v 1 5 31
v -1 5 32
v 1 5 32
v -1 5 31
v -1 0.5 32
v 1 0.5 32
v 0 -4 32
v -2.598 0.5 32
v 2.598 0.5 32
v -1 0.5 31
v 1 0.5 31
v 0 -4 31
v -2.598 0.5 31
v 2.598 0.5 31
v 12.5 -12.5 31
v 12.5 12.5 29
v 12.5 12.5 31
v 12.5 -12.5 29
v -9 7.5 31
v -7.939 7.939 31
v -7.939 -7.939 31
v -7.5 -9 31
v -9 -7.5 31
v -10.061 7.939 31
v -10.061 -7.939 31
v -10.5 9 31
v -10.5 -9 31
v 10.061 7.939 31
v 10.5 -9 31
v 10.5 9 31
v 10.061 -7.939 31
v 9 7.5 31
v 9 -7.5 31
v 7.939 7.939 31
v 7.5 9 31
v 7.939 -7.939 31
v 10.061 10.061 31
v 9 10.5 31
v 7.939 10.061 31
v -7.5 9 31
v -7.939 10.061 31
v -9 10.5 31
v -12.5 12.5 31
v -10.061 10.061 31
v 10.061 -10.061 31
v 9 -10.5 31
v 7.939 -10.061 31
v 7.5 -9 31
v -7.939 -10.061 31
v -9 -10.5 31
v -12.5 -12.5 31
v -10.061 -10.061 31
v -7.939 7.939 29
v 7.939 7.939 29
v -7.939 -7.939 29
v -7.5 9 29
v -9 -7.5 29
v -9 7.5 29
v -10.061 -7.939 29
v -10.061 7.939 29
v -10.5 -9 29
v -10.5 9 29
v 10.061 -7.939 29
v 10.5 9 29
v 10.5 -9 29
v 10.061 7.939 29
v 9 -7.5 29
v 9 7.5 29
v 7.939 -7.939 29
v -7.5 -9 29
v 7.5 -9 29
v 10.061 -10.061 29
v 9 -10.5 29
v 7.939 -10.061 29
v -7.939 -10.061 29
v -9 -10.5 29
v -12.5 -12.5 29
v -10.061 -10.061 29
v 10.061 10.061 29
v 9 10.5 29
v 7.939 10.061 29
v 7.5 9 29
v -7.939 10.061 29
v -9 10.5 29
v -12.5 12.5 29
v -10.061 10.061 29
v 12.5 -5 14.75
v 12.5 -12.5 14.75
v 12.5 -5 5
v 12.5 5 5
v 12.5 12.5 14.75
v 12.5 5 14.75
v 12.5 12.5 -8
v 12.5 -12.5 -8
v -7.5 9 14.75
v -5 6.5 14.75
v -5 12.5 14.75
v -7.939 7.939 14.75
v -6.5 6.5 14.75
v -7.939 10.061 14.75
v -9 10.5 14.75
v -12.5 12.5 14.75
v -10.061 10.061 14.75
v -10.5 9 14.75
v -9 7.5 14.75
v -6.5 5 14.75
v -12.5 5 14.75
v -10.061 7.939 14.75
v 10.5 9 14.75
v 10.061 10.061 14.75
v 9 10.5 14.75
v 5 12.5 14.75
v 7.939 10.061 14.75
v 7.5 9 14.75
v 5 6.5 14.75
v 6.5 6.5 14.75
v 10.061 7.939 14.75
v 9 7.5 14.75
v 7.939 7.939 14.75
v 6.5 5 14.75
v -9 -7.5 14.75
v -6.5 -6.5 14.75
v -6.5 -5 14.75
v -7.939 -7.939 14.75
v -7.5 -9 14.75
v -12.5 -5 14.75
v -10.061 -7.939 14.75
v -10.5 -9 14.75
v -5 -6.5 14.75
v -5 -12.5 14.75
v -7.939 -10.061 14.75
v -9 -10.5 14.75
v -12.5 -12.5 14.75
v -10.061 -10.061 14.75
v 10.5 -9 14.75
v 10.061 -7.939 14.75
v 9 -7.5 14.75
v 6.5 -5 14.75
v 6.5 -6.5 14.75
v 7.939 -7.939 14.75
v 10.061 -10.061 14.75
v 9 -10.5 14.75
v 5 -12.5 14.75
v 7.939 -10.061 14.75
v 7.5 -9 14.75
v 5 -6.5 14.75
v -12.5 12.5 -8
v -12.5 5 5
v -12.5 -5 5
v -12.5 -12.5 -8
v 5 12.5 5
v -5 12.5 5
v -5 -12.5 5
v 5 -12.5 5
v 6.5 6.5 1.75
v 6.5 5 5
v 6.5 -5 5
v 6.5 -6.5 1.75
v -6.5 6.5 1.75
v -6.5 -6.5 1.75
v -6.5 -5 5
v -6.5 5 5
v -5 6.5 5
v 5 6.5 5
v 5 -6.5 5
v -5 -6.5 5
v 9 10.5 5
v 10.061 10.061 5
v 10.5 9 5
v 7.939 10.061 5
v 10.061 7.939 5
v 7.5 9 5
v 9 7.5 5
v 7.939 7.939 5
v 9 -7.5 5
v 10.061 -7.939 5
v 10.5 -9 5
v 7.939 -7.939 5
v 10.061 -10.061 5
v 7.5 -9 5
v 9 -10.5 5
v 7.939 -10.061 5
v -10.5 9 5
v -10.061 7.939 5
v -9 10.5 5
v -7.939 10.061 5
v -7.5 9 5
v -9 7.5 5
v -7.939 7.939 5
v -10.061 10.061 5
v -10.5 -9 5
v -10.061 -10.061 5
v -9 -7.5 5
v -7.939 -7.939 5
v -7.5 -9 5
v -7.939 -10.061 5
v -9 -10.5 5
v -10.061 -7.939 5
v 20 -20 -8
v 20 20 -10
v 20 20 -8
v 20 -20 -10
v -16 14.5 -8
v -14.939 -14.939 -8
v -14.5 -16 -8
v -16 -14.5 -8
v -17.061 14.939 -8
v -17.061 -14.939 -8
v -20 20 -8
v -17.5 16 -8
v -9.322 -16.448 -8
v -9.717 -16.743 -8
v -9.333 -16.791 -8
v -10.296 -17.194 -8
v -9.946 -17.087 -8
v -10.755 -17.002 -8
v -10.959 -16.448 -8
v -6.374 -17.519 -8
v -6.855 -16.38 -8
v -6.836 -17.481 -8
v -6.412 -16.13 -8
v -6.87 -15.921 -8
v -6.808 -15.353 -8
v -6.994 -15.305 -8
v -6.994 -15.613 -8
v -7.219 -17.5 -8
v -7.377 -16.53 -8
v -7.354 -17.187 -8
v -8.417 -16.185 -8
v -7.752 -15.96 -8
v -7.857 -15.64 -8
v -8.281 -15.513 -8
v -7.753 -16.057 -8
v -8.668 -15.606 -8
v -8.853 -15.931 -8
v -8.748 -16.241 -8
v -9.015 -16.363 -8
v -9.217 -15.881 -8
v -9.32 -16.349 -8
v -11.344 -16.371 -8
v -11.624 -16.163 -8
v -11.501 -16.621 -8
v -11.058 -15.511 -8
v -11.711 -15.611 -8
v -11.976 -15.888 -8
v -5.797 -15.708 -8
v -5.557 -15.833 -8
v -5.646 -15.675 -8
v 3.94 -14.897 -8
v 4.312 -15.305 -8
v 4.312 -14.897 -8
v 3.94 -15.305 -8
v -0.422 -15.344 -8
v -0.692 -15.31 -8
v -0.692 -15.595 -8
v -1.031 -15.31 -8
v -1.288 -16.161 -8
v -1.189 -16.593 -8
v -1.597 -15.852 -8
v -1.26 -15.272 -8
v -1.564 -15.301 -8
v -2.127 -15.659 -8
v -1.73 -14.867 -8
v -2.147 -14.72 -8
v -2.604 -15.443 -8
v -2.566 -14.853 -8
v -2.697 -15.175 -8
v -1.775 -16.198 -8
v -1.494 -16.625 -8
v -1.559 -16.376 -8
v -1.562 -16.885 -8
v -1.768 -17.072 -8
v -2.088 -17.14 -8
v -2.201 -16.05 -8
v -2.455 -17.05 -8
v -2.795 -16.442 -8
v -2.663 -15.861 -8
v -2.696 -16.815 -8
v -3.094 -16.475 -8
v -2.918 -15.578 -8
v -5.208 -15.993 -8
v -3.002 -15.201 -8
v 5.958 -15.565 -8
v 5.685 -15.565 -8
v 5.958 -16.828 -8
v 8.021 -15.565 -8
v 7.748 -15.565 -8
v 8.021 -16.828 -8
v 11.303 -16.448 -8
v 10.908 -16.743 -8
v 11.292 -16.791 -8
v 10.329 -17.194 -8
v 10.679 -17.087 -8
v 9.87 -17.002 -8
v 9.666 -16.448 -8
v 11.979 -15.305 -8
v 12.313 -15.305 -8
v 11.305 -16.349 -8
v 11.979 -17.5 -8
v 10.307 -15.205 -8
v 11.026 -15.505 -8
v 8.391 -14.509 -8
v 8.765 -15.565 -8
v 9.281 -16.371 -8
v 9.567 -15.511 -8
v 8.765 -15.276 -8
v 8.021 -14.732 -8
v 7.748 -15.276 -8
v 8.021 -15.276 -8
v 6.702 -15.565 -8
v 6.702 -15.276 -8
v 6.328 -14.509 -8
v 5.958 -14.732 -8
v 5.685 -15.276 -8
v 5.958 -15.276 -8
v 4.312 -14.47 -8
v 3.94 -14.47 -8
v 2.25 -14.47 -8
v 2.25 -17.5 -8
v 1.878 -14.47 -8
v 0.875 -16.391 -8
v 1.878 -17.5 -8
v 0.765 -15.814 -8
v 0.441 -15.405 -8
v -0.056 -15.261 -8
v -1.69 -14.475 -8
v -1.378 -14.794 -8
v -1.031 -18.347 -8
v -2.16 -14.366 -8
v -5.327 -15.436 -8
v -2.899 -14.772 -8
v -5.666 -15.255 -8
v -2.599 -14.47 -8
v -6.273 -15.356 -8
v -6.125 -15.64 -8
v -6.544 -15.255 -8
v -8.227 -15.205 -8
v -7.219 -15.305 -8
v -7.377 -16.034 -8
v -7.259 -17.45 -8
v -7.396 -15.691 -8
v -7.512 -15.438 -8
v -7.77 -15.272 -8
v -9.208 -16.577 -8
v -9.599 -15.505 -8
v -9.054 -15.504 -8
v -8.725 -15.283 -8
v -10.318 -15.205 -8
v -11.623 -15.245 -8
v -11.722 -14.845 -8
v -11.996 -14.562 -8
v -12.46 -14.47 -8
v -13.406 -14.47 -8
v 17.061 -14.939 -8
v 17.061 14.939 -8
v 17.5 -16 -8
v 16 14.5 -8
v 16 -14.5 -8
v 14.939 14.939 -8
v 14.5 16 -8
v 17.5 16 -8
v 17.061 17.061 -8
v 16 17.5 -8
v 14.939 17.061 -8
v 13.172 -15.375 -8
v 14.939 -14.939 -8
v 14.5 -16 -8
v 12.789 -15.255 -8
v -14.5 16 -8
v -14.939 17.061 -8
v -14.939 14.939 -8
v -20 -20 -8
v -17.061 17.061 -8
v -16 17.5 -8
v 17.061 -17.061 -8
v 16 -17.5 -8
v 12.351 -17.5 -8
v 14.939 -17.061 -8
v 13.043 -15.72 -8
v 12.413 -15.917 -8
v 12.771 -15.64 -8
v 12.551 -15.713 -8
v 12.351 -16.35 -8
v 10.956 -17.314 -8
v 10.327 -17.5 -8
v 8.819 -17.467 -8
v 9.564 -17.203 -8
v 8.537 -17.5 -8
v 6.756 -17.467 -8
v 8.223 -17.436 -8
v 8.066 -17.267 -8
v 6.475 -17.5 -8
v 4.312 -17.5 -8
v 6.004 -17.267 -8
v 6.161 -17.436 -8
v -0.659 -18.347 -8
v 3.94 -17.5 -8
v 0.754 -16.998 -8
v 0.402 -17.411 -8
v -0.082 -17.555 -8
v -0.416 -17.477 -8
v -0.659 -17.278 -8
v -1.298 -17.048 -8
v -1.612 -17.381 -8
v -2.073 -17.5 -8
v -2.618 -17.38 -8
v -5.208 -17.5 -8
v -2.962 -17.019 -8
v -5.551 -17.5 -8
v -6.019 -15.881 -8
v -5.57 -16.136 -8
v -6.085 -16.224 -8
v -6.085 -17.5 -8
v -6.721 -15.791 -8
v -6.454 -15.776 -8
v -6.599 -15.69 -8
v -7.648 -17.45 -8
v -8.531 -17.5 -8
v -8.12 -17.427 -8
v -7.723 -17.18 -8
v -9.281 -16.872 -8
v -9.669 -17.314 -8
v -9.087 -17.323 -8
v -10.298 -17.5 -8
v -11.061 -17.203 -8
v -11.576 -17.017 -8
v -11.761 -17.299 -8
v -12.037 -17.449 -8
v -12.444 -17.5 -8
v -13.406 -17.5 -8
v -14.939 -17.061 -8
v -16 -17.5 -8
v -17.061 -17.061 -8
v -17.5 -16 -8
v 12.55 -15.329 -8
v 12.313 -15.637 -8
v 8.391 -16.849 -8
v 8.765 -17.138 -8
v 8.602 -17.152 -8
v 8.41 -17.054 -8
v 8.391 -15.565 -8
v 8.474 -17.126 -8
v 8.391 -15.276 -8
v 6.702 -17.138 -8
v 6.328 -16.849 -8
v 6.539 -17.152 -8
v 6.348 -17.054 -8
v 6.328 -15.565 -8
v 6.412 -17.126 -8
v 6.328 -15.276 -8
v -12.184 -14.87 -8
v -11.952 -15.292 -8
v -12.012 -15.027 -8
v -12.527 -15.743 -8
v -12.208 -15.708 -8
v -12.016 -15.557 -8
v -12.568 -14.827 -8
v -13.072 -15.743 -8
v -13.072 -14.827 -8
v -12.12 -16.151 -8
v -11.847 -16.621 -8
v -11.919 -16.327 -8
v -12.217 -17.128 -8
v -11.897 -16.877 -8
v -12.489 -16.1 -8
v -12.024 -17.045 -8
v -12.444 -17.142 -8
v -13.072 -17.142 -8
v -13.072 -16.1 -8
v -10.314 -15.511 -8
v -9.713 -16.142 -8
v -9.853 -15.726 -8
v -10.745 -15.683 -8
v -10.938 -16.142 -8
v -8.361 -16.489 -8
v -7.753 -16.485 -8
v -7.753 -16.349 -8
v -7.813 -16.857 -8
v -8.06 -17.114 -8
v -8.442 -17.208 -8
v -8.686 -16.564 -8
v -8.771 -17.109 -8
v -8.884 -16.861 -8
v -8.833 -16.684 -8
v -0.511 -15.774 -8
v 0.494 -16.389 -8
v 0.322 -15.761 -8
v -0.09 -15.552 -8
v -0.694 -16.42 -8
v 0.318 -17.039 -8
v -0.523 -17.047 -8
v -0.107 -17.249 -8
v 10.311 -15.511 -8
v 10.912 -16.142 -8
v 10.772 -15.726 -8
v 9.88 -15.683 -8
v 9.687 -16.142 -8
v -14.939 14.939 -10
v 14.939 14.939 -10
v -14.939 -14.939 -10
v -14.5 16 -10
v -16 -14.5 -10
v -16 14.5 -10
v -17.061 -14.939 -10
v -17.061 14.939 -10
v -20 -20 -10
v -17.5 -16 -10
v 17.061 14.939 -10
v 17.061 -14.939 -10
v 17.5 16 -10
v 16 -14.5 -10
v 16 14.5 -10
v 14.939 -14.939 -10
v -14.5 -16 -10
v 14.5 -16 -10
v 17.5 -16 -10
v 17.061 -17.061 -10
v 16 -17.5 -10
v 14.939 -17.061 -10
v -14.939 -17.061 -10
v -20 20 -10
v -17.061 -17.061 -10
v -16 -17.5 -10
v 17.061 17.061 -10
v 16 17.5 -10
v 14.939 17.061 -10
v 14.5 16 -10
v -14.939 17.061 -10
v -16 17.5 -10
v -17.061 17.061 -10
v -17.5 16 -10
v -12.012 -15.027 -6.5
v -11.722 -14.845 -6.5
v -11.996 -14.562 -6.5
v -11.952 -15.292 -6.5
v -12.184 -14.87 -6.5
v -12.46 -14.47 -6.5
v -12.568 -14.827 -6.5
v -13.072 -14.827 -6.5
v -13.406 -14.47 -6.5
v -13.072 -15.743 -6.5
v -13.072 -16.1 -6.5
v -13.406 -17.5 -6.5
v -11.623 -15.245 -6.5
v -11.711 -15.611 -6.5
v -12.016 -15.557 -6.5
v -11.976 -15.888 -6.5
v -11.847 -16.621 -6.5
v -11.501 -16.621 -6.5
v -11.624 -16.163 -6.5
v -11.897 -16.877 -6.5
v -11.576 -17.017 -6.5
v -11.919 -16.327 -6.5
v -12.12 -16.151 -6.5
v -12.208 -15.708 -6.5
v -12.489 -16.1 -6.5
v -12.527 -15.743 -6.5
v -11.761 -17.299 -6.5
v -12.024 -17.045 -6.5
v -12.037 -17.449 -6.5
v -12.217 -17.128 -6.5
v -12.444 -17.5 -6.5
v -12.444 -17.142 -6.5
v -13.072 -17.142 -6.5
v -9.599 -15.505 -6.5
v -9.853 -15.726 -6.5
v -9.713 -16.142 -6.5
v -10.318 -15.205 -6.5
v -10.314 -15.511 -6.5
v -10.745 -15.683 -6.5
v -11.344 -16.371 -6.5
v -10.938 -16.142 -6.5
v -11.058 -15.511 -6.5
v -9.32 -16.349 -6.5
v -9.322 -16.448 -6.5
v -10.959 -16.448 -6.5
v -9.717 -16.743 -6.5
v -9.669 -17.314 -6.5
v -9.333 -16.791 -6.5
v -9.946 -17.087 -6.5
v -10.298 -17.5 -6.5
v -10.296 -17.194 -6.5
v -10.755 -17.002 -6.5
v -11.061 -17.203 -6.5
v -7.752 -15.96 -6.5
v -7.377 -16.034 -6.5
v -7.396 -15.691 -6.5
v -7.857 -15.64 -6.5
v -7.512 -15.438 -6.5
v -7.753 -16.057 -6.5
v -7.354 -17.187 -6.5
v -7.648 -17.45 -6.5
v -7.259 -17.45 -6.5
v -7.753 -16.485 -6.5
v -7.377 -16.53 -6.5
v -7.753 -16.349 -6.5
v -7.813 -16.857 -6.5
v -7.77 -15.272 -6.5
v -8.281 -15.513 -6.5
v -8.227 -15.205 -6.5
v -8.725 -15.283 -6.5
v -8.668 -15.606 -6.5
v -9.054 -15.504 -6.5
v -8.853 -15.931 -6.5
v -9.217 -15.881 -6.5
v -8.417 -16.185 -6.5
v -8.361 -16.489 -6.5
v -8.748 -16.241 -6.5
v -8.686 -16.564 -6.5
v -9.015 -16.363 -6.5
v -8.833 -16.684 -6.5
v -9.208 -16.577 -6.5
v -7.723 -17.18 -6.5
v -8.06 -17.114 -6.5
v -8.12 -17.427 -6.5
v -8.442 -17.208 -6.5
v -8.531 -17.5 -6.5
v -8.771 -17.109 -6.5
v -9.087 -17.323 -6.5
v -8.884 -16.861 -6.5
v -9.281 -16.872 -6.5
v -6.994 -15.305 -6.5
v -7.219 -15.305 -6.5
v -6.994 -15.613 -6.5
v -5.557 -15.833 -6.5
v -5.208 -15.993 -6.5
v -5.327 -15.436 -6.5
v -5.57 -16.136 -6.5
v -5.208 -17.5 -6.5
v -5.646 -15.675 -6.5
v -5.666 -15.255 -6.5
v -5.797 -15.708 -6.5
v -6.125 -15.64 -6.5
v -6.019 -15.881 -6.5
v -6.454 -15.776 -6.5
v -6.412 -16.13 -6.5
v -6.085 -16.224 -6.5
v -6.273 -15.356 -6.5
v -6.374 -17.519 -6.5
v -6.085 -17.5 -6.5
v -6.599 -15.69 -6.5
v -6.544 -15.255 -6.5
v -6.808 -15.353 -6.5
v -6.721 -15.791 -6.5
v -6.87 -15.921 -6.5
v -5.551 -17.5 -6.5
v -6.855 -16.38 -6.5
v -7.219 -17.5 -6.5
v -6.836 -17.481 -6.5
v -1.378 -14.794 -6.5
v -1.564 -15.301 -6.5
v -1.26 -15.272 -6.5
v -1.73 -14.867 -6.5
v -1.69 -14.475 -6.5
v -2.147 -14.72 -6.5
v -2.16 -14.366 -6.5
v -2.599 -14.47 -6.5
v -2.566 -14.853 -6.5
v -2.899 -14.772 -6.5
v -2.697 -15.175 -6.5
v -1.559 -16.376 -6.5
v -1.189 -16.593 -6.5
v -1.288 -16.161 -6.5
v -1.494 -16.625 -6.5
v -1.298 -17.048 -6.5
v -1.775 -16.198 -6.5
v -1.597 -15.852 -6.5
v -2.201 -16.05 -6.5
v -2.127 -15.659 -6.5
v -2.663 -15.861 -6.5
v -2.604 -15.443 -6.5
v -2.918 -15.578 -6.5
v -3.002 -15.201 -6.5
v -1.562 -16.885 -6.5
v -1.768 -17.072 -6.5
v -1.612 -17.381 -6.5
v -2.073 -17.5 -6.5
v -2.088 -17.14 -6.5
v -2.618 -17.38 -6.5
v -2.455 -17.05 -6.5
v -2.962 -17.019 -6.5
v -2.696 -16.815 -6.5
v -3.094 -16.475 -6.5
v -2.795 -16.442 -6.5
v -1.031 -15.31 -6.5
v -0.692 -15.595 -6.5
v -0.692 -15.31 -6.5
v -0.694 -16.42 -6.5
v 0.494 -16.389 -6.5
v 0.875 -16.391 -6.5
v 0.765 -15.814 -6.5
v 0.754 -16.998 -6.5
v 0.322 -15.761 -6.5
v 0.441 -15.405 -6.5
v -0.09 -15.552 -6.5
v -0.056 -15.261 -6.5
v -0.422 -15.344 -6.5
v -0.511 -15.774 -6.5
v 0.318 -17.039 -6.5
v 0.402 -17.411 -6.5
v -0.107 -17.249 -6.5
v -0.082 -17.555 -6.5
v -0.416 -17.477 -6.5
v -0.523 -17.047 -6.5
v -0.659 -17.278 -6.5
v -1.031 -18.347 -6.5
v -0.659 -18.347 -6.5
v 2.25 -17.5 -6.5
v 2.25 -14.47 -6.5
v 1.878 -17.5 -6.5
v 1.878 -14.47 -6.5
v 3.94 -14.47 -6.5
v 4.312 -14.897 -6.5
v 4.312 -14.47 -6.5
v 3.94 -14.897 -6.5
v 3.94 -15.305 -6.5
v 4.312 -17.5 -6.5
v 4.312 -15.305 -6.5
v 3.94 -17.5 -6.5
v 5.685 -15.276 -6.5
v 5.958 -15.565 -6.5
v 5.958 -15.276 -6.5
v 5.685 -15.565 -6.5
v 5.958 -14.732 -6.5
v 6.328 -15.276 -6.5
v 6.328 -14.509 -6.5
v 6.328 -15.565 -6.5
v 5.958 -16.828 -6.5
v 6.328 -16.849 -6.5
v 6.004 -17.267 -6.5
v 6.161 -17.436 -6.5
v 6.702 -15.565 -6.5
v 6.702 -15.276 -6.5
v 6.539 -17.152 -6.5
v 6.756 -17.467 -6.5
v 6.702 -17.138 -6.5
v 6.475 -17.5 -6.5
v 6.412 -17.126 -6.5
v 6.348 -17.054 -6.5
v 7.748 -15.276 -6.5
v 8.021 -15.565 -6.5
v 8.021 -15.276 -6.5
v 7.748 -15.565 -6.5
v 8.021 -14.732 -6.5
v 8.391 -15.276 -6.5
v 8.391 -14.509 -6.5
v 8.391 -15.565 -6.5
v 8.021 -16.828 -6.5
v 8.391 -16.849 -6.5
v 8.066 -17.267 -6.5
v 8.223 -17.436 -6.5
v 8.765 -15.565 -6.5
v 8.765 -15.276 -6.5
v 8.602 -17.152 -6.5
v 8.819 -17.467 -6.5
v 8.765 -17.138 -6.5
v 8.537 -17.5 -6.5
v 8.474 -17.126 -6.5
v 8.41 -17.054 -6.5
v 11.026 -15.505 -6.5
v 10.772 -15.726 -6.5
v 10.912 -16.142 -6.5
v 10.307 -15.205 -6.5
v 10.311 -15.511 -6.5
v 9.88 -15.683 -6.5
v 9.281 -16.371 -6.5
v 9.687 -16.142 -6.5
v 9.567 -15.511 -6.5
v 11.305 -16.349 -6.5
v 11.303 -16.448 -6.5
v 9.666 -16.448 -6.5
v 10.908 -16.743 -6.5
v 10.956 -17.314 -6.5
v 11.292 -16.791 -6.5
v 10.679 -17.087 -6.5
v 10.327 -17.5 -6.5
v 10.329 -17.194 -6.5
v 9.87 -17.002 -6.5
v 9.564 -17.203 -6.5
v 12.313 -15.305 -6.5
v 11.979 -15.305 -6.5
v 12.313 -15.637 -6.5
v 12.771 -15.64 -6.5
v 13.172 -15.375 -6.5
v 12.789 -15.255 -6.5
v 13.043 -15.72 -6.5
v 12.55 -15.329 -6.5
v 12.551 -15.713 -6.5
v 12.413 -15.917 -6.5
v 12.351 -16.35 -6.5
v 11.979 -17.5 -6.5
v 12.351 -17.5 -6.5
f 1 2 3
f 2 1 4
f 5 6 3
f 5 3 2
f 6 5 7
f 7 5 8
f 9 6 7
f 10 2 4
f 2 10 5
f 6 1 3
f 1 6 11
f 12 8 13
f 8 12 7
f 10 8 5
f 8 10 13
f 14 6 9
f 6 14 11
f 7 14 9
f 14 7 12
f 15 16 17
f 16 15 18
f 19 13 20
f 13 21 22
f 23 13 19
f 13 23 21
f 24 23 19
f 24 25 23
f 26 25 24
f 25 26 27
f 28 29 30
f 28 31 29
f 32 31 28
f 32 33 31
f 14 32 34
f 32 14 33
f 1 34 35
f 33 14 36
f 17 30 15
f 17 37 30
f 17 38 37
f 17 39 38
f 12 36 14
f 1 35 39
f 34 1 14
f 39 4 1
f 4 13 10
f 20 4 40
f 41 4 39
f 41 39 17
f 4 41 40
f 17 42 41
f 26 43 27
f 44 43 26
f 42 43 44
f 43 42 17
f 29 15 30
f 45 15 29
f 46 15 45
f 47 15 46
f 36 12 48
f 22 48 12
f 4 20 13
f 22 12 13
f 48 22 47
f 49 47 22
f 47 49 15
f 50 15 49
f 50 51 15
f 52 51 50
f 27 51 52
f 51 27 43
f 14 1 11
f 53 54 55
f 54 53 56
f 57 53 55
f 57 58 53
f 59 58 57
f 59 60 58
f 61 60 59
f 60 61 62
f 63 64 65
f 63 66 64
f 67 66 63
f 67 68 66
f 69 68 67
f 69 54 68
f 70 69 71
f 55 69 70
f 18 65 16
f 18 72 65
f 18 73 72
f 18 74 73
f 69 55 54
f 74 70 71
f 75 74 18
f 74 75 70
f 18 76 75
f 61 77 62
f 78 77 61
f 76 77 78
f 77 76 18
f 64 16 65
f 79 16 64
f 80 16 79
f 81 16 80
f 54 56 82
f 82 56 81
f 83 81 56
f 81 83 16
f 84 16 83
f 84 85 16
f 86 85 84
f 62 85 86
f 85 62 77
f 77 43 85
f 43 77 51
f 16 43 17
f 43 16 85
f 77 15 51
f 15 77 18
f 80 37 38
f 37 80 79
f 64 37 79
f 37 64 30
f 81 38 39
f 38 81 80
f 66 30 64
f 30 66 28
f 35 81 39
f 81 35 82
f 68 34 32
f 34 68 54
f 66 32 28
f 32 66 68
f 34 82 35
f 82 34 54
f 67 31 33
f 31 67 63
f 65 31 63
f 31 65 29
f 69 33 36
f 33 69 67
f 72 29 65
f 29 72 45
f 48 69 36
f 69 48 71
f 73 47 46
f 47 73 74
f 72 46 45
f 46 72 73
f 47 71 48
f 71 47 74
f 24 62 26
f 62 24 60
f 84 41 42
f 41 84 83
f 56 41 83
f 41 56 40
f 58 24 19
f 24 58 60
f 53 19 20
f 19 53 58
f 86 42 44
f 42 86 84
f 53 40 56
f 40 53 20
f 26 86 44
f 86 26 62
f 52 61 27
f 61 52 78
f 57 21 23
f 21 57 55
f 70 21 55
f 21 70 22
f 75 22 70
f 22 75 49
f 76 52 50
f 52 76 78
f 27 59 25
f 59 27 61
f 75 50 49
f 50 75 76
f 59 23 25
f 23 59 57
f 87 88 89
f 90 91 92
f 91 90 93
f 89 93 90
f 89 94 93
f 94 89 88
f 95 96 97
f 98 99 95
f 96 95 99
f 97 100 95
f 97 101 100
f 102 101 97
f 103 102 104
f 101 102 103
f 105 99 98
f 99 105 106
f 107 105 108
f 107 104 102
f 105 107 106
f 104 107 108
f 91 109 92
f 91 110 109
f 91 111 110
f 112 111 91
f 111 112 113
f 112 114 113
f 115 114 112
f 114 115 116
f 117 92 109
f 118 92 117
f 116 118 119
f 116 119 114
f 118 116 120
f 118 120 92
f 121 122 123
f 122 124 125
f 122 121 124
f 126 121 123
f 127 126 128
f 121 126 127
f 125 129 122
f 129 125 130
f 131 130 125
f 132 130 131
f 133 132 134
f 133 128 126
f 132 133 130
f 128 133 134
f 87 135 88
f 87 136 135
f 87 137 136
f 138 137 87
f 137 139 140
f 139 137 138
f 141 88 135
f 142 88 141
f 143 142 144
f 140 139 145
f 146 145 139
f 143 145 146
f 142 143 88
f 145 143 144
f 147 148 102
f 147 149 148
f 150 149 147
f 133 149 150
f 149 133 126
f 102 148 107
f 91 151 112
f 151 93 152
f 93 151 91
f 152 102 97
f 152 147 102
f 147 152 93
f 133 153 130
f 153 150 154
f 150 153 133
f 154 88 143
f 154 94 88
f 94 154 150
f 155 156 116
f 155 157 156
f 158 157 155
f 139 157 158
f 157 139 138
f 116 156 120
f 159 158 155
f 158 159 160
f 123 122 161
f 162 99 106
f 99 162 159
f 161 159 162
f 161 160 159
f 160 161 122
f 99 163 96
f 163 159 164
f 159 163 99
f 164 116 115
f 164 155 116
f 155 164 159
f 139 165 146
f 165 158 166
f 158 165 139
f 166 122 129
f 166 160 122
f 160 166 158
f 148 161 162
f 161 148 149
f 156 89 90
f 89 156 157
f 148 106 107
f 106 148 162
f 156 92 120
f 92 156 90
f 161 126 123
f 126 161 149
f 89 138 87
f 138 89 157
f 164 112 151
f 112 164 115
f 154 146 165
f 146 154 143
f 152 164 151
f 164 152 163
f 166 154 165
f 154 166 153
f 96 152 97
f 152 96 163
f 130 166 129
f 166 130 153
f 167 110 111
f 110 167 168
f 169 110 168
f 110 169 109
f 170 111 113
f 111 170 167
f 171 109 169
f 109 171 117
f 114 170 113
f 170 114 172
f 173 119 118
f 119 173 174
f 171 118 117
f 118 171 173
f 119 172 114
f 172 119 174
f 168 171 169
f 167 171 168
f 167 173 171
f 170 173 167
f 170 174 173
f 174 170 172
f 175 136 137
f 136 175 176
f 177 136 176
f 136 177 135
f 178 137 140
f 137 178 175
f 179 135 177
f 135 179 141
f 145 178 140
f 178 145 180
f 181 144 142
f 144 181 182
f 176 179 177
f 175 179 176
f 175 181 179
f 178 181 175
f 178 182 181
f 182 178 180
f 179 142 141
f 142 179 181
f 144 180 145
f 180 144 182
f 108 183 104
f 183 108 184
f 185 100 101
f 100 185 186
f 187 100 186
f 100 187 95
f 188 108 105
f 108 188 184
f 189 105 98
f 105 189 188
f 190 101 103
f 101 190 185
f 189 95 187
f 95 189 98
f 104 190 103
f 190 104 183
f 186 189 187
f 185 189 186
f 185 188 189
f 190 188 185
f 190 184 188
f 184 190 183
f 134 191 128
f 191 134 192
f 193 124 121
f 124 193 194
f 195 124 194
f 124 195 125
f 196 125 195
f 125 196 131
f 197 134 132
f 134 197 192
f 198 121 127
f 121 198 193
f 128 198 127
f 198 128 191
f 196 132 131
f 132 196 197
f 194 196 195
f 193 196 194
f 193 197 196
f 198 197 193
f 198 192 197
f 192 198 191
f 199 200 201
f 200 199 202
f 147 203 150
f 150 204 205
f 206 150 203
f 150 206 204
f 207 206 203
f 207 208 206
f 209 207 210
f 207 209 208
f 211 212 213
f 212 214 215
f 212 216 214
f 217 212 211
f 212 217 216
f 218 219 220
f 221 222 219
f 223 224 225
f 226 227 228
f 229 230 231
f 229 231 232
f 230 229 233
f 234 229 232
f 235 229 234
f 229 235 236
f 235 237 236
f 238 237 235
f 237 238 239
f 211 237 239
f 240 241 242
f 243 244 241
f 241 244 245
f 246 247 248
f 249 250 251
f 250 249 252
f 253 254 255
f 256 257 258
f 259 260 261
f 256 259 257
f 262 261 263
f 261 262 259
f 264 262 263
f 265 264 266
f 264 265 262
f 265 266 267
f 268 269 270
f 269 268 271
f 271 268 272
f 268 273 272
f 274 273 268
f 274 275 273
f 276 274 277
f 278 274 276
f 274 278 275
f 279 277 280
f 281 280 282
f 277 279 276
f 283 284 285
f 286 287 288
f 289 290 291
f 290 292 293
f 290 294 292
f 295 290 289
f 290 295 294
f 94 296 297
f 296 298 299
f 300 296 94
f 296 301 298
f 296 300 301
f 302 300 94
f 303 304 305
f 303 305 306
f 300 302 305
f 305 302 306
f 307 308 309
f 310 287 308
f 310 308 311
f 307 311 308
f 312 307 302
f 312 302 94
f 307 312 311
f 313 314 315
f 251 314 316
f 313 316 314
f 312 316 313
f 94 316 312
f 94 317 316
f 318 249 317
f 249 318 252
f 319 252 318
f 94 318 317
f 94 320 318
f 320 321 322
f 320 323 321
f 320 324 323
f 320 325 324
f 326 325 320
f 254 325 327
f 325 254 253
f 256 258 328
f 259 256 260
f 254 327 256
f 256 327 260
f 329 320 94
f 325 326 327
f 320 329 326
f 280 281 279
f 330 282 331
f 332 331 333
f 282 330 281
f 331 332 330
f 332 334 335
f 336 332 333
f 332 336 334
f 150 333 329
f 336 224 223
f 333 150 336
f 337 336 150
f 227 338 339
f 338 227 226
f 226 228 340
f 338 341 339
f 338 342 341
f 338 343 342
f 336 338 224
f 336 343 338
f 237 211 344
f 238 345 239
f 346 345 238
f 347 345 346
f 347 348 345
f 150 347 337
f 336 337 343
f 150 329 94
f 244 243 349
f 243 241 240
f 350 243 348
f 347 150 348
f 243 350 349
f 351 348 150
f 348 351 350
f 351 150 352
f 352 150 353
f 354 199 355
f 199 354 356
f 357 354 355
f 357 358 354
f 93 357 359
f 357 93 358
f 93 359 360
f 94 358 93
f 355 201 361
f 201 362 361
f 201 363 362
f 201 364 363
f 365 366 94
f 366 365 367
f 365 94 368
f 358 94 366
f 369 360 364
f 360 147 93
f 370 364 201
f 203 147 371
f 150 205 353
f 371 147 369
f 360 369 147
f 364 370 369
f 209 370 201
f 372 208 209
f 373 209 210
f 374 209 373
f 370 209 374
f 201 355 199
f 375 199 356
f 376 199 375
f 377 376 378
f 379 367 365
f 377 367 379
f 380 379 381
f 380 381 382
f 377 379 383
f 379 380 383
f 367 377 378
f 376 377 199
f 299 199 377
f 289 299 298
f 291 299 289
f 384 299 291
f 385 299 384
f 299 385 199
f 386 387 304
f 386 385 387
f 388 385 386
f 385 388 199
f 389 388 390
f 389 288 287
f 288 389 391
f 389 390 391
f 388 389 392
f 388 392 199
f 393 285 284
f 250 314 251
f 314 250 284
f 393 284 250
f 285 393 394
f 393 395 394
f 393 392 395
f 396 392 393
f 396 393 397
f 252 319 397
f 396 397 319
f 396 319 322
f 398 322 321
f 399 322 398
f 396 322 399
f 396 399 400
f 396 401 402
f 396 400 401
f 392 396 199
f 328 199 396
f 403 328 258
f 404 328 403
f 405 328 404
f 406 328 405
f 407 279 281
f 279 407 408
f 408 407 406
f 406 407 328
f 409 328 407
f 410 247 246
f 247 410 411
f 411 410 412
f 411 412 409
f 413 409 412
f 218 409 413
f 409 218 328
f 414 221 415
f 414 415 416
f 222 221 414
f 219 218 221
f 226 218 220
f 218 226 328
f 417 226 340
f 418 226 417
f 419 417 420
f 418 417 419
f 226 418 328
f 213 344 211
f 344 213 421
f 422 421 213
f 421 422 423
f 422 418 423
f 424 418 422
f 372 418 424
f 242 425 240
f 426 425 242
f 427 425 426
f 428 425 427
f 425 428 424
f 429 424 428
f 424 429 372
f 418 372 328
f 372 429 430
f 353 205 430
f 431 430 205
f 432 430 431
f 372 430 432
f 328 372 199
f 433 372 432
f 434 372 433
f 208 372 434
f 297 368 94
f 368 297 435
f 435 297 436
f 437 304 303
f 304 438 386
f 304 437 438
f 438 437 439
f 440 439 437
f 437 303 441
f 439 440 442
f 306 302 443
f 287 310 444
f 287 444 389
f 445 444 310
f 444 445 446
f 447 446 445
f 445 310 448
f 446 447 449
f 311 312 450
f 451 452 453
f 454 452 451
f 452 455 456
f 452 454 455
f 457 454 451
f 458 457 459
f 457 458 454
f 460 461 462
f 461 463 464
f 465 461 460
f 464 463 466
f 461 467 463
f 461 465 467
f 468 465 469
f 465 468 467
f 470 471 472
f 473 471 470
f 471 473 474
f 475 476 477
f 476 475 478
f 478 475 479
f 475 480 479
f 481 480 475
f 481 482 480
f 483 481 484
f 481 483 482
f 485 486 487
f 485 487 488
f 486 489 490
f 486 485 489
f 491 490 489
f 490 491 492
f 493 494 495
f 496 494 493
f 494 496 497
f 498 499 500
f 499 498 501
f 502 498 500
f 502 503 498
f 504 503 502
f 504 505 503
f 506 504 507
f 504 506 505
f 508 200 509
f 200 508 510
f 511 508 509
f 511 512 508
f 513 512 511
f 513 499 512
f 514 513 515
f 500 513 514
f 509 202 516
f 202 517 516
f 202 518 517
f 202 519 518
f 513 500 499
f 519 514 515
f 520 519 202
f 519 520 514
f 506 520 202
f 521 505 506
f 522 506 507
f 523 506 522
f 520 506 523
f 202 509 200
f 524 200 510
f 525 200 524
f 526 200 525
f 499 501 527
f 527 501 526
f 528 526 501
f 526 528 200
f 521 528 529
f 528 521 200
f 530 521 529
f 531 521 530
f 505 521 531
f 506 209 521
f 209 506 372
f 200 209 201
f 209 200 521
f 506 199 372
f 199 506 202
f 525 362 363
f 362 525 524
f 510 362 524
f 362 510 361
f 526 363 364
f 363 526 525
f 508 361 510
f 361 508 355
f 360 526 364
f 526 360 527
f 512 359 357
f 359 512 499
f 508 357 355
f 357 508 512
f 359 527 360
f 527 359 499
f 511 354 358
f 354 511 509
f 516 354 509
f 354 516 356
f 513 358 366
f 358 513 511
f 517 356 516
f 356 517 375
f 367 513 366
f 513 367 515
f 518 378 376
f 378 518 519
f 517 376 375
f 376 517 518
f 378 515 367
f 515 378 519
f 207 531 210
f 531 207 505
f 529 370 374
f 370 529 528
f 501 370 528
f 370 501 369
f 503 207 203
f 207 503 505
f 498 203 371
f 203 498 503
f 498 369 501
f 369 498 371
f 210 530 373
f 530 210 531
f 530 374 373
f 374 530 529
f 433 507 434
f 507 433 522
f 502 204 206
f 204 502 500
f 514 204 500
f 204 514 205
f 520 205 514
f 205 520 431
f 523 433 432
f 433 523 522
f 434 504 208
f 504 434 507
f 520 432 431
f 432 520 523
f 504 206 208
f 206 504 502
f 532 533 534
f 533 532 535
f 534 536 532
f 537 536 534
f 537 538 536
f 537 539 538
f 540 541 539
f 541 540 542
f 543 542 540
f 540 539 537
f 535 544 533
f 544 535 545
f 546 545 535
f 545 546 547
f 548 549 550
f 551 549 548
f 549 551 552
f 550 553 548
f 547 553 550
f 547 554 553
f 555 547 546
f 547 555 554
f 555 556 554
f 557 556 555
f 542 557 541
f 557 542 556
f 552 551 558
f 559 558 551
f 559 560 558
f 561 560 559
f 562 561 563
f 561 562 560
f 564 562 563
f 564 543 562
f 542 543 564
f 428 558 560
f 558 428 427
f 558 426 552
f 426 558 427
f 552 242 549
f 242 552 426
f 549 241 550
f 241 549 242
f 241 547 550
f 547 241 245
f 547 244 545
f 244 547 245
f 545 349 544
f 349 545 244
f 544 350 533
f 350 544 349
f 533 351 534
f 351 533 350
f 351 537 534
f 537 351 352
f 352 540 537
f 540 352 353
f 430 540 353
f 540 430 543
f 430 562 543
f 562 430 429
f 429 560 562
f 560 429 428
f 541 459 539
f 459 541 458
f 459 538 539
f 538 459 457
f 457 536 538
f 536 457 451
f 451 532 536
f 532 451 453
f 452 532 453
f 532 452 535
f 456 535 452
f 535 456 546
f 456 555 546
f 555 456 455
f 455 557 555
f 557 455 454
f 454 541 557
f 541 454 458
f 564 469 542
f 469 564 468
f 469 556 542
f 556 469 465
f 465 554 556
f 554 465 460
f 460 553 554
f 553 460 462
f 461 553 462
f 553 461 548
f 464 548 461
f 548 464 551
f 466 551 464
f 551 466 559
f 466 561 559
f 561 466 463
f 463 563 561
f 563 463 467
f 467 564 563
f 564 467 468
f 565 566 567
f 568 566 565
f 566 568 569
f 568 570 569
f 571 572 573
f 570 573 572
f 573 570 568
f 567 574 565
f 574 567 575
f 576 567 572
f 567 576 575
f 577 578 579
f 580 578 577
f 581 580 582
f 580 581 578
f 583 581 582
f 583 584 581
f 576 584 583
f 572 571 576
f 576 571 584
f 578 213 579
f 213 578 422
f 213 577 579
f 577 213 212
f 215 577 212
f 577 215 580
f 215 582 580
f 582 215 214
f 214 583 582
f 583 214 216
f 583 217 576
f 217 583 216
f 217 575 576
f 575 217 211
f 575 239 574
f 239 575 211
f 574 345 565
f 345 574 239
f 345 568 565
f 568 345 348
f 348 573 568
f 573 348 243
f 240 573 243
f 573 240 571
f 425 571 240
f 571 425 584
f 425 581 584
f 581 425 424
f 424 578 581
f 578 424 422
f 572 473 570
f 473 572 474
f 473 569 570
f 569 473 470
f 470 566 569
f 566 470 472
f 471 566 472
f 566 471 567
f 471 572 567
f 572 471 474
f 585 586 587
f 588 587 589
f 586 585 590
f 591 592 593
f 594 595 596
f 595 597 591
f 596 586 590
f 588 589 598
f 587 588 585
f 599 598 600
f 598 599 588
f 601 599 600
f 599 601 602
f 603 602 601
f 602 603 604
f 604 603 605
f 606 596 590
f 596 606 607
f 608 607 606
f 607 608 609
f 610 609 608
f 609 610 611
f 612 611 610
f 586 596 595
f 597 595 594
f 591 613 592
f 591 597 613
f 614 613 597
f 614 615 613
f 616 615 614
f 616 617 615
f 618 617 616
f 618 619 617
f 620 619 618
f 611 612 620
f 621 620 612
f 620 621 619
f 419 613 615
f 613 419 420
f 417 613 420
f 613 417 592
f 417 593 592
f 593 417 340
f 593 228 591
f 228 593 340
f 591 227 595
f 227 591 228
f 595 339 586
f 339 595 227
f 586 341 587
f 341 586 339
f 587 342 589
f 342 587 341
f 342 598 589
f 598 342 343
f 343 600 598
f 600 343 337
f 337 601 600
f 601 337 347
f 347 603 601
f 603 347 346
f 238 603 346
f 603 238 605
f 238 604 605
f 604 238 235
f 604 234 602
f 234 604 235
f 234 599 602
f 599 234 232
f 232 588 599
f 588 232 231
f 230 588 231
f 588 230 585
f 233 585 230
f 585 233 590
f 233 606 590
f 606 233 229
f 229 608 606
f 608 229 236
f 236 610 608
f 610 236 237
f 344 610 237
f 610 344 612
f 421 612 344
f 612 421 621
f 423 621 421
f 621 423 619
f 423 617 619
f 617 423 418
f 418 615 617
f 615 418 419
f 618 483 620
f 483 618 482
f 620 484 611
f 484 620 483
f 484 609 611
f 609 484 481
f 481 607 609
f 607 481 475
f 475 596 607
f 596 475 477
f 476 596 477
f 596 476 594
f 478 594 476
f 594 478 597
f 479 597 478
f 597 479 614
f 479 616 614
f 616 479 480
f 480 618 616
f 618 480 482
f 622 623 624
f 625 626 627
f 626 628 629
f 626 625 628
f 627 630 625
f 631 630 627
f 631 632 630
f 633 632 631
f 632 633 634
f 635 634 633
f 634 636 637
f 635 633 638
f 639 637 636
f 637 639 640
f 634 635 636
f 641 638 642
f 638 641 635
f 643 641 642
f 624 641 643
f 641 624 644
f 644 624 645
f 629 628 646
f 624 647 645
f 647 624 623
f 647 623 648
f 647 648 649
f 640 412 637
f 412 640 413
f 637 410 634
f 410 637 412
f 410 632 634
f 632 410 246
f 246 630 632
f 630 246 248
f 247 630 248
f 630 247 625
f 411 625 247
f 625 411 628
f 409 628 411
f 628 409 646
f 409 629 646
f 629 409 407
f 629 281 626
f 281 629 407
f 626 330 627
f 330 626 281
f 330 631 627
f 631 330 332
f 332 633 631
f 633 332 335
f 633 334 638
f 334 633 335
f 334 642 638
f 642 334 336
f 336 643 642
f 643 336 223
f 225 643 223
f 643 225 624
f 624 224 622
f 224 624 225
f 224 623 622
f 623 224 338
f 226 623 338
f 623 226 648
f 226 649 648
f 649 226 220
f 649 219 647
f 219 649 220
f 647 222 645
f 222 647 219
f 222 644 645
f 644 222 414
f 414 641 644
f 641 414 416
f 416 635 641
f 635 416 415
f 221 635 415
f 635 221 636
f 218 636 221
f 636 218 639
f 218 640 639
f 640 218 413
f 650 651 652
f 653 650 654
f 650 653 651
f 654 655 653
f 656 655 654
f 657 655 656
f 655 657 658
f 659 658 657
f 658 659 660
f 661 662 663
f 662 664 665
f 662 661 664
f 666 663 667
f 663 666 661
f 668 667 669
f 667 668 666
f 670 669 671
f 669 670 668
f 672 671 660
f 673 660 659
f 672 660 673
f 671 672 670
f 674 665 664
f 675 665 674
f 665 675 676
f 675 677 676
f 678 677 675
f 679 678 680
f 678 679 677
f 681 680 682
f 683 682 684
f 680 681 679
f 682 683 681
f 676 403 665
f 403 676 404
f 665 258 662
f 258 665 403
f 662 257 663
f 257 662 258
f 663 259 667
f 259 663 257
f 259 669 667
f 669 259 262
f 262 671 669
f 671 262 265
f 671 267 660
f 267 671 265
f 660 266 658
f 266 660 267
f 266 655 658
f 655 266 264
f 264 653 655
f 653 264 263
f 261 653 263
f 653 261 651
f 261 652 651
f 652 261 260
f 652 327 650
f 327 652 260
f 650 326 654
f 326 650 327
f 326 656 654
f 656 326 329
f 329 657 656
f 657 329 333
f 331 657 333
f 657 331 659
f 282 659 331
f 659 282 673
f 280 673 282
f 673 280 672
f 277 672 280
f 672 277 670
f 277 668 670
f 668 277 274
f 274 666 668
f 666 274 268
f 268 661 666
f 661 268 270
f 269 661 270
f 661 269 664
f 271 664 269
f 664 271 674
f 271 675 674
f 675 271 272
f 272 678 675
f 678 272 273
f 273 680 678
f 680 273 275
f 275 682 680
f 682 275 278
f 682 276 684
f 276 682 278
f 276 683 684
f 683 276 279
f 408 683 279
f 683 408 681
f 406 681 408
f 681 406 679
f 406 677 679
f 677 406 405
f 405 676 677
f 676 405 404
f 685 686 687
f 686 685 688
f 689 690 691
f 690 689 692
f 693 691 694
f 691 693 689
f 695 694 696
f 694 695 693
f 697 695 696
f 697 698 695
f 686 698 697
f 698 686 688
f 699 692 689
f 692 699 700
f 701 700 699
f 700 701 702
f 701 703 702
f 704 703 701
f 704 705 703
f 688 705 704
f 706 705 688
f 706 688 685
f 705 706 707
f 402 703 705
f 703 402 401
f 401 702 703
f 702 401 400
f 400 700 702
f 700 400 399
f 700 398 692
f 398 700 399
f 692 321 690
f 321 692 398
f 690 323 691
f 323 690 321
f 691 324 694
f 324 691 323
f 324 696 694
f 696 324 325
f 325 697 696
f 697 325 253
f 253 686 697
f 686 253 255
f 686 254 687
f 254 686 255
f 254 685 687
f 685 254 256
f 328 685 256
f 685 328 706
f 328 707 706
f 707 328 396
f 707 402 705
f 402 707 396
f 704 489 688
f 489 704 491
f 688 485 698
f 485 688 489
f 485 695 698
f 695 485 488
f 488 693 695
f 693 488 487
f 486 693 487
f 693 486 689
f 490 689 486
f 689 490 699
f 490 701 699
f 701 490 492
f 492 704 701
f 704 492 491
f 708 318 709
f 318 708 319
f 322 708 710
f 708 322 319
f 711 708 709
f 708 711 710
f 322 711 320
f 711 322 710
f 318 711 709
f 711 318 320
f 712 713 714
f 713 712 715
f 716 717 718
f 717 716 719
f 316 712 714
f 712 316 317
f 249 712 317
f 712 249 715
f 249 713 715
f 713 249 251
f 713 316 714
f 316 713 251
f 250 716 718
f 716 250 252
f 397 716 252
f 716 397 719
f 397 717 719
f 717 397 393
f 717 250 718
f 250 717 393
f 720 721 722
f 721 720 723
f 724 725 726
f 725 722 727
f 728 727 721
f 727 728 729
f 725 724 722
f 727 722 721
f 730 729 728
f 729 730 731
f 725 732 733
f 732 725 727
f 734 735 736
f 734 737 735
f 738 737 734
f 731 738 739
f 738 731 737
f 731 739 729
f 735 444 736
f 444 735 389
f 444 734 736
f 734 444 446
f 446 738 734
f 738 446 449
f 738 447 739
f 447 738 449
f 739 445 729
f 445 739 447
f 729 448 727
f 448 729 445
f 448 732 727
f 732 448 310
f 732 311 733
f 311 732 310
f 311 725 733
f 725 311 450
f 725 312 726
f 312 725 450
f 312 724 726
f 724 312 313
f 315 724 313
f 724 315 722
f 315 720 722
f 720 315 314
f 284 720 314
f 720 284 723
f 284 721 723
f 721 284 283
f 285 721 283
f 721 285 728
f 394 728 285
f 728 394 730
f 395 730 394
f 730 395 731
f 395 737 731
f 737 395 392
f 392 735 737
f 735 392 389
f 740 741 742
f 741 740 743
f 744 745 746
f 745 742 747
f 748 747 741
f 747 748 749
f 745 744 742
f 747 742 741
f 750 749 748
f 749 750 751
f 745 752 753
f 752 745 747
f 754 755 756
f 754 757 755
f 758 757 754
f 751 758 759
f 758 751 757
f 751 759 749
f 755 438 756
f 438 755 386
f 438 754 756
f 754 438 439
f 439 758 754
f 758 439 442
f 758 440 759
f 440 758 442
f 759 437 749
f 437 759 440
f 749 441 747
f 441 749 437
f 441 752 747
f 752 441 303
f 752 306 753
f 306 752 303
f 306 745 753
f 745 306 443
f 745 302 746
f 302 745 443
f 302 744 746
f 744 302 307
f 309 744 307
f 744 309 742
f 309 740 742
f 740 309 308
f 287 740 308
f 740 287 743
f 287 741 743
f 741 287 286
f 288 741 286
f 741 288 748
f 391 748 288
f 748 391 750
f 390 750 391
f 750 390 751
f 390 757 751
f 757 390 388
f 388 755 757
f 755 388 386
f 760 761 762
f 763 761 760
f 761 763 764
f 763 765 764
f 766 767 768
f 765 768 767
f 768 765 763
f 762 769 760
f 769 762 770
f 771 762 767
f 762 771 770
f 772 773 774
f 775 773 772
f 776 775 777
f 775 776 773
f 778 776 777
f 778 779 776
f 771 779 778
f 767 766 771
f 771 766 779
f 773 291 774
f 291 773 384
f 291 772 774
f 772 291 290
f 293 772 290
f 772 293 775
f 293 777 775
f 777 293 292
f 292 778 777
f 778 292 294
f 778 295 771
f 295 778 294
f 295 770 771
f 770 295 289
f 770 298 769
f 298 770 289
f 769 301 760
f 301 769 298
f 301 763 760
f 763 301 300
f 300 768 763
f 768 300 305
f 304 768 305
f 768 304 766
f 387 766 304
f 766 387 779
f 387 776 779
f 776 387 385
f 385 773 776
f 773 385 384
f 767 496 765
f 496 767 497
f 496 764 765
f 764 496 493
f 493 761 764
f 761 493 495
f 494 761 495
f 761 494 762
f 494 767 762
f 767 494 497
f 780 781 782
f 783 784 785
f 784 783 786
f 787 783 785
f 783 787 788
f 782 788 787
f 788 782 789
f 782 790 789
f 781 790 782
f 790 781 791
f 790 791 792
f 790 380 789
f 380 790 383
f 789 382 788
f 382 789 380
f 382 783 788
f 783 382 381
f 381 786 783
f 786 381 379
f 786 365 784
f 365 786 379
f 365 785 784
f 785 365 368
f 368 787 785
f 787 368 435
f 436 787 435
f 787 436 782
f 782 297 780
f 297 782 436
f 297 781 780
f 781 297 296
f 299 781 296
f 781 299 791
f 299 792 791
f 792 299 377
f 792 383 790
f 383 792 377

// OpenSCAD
// file: ../arrow.scad
module arrow(){
	//arrowBody
	translate([0,-1,0]) color([0,1,1]) cube(size=[2.5,2,5]);
	//arrowHead
	translate([0,0,-1]) color([0,1,1]) rotate([0,90,0]) cylinder(h=2.5,r=3,$fn=3);
}

arrow();
// file: ../opticsMount_beamSplitter_bottom.scad
use <write.scad>

module beamSplitterMountBottom(){
	difference(){
		//mainBody
		translate([0,0,3.25]) color([.95,.95,.95]) cube(size=[25,25,23],center=true);
		//centerCube
		translate([0,0,8.25]) color([.25,.95,.95]) cube(size=[13,13,13],center=true);
		//laserPath
		translate([0,0,10]) color([0,.95,0]) cube(size=[30,10,10],center=true);
		translate([0,0,10]) color([.1,.15,.95]) cube(size=[10,30,10],center=true);
		//topScrewholes
		translate([9,9,10]) color([1,0,0]) cylinder(h=10,r=1.5,$fn=8,center=true);
		translate([9,-9,10]) color([1,0,0]) cylinder(h=10,r=1.5,$fn=8,center=true);
		translate([-9,9,10]) color([1,0,0]) cylinder(h=10,r=1.5,$fn=8,center=true);
		translate([-9,-9,10]) color([1,0,0]) cylinder(h=10,r=1.5,$fn=8,center=true);
	}
	difference(){
		//base
		translate([0,0,-9]) color([.95,.95,.95]) cube(size=[40,40,2],center=true);
		//baseScrewholes
		translate([16,16,-9]) color([1,0,0]) cylinder(h=5,r=1.5,$fn=8,center=true);
		translate([16,-16,-9]) color([1,0,0]) cylinder(h=5,r=1.5,$fn=8,center=true);
		translate([-16,16,-9]) color([1,0,0]) cylinder(h=5,r=1.5,$fn=8,center=true);
		translate([-16,-16,-9]) color([1,0,0]) cylinder(h=5,r=1.5,$fn=8,center=true);
	}
	rotate([0,0,0]){
		translate([0,-16,-8]){
			write("Beam Splitter",h=3,t=3,center=true);
		}
	}
}

translate([0,0,0]){
	beamSplitterMountBottom();
}
// file: ../opticsMount_beamSplitter_top.scad
use <arrow.scad>

module beamSplitterMountTop(){
	//arrow
	translate([0,0,2]){
		rotate([0,90,90]){
			arrow();
		}
	}

	difference(){
		translate([0,0,0]) color([.95,.95,.95]) cube(size=[25,25,2],center=true);
		//topScrewholes
		translate([9,9,0]) color([1,0,0]) cylinder(h=5,r=1.5,$fn=8,center=true);
		translate([9,-9,0]) color([1,0,0]) cylinder(h=5,r=1.5,$fn=8,center=true);
		translate([-9,9,0]) color([1,0,0]) cylinder(h=5,r=1.5,$fn=8,center=true);
		translate([-9,-9,0]) color([1,0,0]) cylinder(h=5,r=1.5,$fn=8,center=true);
	}
}

translate([0,0,0]){
	beamSplitterMountTop();
}
// main file
use <../write.scad>
use <../opticsMount_beamSplitter_top.scad>
use <../opticsMount_beamSplitter_bottom.scad>

translate([0,0,30]){
	beamSplitterMountTop();
}
translate([0,0,0]){
	beamSplitterMountBottom();
}
